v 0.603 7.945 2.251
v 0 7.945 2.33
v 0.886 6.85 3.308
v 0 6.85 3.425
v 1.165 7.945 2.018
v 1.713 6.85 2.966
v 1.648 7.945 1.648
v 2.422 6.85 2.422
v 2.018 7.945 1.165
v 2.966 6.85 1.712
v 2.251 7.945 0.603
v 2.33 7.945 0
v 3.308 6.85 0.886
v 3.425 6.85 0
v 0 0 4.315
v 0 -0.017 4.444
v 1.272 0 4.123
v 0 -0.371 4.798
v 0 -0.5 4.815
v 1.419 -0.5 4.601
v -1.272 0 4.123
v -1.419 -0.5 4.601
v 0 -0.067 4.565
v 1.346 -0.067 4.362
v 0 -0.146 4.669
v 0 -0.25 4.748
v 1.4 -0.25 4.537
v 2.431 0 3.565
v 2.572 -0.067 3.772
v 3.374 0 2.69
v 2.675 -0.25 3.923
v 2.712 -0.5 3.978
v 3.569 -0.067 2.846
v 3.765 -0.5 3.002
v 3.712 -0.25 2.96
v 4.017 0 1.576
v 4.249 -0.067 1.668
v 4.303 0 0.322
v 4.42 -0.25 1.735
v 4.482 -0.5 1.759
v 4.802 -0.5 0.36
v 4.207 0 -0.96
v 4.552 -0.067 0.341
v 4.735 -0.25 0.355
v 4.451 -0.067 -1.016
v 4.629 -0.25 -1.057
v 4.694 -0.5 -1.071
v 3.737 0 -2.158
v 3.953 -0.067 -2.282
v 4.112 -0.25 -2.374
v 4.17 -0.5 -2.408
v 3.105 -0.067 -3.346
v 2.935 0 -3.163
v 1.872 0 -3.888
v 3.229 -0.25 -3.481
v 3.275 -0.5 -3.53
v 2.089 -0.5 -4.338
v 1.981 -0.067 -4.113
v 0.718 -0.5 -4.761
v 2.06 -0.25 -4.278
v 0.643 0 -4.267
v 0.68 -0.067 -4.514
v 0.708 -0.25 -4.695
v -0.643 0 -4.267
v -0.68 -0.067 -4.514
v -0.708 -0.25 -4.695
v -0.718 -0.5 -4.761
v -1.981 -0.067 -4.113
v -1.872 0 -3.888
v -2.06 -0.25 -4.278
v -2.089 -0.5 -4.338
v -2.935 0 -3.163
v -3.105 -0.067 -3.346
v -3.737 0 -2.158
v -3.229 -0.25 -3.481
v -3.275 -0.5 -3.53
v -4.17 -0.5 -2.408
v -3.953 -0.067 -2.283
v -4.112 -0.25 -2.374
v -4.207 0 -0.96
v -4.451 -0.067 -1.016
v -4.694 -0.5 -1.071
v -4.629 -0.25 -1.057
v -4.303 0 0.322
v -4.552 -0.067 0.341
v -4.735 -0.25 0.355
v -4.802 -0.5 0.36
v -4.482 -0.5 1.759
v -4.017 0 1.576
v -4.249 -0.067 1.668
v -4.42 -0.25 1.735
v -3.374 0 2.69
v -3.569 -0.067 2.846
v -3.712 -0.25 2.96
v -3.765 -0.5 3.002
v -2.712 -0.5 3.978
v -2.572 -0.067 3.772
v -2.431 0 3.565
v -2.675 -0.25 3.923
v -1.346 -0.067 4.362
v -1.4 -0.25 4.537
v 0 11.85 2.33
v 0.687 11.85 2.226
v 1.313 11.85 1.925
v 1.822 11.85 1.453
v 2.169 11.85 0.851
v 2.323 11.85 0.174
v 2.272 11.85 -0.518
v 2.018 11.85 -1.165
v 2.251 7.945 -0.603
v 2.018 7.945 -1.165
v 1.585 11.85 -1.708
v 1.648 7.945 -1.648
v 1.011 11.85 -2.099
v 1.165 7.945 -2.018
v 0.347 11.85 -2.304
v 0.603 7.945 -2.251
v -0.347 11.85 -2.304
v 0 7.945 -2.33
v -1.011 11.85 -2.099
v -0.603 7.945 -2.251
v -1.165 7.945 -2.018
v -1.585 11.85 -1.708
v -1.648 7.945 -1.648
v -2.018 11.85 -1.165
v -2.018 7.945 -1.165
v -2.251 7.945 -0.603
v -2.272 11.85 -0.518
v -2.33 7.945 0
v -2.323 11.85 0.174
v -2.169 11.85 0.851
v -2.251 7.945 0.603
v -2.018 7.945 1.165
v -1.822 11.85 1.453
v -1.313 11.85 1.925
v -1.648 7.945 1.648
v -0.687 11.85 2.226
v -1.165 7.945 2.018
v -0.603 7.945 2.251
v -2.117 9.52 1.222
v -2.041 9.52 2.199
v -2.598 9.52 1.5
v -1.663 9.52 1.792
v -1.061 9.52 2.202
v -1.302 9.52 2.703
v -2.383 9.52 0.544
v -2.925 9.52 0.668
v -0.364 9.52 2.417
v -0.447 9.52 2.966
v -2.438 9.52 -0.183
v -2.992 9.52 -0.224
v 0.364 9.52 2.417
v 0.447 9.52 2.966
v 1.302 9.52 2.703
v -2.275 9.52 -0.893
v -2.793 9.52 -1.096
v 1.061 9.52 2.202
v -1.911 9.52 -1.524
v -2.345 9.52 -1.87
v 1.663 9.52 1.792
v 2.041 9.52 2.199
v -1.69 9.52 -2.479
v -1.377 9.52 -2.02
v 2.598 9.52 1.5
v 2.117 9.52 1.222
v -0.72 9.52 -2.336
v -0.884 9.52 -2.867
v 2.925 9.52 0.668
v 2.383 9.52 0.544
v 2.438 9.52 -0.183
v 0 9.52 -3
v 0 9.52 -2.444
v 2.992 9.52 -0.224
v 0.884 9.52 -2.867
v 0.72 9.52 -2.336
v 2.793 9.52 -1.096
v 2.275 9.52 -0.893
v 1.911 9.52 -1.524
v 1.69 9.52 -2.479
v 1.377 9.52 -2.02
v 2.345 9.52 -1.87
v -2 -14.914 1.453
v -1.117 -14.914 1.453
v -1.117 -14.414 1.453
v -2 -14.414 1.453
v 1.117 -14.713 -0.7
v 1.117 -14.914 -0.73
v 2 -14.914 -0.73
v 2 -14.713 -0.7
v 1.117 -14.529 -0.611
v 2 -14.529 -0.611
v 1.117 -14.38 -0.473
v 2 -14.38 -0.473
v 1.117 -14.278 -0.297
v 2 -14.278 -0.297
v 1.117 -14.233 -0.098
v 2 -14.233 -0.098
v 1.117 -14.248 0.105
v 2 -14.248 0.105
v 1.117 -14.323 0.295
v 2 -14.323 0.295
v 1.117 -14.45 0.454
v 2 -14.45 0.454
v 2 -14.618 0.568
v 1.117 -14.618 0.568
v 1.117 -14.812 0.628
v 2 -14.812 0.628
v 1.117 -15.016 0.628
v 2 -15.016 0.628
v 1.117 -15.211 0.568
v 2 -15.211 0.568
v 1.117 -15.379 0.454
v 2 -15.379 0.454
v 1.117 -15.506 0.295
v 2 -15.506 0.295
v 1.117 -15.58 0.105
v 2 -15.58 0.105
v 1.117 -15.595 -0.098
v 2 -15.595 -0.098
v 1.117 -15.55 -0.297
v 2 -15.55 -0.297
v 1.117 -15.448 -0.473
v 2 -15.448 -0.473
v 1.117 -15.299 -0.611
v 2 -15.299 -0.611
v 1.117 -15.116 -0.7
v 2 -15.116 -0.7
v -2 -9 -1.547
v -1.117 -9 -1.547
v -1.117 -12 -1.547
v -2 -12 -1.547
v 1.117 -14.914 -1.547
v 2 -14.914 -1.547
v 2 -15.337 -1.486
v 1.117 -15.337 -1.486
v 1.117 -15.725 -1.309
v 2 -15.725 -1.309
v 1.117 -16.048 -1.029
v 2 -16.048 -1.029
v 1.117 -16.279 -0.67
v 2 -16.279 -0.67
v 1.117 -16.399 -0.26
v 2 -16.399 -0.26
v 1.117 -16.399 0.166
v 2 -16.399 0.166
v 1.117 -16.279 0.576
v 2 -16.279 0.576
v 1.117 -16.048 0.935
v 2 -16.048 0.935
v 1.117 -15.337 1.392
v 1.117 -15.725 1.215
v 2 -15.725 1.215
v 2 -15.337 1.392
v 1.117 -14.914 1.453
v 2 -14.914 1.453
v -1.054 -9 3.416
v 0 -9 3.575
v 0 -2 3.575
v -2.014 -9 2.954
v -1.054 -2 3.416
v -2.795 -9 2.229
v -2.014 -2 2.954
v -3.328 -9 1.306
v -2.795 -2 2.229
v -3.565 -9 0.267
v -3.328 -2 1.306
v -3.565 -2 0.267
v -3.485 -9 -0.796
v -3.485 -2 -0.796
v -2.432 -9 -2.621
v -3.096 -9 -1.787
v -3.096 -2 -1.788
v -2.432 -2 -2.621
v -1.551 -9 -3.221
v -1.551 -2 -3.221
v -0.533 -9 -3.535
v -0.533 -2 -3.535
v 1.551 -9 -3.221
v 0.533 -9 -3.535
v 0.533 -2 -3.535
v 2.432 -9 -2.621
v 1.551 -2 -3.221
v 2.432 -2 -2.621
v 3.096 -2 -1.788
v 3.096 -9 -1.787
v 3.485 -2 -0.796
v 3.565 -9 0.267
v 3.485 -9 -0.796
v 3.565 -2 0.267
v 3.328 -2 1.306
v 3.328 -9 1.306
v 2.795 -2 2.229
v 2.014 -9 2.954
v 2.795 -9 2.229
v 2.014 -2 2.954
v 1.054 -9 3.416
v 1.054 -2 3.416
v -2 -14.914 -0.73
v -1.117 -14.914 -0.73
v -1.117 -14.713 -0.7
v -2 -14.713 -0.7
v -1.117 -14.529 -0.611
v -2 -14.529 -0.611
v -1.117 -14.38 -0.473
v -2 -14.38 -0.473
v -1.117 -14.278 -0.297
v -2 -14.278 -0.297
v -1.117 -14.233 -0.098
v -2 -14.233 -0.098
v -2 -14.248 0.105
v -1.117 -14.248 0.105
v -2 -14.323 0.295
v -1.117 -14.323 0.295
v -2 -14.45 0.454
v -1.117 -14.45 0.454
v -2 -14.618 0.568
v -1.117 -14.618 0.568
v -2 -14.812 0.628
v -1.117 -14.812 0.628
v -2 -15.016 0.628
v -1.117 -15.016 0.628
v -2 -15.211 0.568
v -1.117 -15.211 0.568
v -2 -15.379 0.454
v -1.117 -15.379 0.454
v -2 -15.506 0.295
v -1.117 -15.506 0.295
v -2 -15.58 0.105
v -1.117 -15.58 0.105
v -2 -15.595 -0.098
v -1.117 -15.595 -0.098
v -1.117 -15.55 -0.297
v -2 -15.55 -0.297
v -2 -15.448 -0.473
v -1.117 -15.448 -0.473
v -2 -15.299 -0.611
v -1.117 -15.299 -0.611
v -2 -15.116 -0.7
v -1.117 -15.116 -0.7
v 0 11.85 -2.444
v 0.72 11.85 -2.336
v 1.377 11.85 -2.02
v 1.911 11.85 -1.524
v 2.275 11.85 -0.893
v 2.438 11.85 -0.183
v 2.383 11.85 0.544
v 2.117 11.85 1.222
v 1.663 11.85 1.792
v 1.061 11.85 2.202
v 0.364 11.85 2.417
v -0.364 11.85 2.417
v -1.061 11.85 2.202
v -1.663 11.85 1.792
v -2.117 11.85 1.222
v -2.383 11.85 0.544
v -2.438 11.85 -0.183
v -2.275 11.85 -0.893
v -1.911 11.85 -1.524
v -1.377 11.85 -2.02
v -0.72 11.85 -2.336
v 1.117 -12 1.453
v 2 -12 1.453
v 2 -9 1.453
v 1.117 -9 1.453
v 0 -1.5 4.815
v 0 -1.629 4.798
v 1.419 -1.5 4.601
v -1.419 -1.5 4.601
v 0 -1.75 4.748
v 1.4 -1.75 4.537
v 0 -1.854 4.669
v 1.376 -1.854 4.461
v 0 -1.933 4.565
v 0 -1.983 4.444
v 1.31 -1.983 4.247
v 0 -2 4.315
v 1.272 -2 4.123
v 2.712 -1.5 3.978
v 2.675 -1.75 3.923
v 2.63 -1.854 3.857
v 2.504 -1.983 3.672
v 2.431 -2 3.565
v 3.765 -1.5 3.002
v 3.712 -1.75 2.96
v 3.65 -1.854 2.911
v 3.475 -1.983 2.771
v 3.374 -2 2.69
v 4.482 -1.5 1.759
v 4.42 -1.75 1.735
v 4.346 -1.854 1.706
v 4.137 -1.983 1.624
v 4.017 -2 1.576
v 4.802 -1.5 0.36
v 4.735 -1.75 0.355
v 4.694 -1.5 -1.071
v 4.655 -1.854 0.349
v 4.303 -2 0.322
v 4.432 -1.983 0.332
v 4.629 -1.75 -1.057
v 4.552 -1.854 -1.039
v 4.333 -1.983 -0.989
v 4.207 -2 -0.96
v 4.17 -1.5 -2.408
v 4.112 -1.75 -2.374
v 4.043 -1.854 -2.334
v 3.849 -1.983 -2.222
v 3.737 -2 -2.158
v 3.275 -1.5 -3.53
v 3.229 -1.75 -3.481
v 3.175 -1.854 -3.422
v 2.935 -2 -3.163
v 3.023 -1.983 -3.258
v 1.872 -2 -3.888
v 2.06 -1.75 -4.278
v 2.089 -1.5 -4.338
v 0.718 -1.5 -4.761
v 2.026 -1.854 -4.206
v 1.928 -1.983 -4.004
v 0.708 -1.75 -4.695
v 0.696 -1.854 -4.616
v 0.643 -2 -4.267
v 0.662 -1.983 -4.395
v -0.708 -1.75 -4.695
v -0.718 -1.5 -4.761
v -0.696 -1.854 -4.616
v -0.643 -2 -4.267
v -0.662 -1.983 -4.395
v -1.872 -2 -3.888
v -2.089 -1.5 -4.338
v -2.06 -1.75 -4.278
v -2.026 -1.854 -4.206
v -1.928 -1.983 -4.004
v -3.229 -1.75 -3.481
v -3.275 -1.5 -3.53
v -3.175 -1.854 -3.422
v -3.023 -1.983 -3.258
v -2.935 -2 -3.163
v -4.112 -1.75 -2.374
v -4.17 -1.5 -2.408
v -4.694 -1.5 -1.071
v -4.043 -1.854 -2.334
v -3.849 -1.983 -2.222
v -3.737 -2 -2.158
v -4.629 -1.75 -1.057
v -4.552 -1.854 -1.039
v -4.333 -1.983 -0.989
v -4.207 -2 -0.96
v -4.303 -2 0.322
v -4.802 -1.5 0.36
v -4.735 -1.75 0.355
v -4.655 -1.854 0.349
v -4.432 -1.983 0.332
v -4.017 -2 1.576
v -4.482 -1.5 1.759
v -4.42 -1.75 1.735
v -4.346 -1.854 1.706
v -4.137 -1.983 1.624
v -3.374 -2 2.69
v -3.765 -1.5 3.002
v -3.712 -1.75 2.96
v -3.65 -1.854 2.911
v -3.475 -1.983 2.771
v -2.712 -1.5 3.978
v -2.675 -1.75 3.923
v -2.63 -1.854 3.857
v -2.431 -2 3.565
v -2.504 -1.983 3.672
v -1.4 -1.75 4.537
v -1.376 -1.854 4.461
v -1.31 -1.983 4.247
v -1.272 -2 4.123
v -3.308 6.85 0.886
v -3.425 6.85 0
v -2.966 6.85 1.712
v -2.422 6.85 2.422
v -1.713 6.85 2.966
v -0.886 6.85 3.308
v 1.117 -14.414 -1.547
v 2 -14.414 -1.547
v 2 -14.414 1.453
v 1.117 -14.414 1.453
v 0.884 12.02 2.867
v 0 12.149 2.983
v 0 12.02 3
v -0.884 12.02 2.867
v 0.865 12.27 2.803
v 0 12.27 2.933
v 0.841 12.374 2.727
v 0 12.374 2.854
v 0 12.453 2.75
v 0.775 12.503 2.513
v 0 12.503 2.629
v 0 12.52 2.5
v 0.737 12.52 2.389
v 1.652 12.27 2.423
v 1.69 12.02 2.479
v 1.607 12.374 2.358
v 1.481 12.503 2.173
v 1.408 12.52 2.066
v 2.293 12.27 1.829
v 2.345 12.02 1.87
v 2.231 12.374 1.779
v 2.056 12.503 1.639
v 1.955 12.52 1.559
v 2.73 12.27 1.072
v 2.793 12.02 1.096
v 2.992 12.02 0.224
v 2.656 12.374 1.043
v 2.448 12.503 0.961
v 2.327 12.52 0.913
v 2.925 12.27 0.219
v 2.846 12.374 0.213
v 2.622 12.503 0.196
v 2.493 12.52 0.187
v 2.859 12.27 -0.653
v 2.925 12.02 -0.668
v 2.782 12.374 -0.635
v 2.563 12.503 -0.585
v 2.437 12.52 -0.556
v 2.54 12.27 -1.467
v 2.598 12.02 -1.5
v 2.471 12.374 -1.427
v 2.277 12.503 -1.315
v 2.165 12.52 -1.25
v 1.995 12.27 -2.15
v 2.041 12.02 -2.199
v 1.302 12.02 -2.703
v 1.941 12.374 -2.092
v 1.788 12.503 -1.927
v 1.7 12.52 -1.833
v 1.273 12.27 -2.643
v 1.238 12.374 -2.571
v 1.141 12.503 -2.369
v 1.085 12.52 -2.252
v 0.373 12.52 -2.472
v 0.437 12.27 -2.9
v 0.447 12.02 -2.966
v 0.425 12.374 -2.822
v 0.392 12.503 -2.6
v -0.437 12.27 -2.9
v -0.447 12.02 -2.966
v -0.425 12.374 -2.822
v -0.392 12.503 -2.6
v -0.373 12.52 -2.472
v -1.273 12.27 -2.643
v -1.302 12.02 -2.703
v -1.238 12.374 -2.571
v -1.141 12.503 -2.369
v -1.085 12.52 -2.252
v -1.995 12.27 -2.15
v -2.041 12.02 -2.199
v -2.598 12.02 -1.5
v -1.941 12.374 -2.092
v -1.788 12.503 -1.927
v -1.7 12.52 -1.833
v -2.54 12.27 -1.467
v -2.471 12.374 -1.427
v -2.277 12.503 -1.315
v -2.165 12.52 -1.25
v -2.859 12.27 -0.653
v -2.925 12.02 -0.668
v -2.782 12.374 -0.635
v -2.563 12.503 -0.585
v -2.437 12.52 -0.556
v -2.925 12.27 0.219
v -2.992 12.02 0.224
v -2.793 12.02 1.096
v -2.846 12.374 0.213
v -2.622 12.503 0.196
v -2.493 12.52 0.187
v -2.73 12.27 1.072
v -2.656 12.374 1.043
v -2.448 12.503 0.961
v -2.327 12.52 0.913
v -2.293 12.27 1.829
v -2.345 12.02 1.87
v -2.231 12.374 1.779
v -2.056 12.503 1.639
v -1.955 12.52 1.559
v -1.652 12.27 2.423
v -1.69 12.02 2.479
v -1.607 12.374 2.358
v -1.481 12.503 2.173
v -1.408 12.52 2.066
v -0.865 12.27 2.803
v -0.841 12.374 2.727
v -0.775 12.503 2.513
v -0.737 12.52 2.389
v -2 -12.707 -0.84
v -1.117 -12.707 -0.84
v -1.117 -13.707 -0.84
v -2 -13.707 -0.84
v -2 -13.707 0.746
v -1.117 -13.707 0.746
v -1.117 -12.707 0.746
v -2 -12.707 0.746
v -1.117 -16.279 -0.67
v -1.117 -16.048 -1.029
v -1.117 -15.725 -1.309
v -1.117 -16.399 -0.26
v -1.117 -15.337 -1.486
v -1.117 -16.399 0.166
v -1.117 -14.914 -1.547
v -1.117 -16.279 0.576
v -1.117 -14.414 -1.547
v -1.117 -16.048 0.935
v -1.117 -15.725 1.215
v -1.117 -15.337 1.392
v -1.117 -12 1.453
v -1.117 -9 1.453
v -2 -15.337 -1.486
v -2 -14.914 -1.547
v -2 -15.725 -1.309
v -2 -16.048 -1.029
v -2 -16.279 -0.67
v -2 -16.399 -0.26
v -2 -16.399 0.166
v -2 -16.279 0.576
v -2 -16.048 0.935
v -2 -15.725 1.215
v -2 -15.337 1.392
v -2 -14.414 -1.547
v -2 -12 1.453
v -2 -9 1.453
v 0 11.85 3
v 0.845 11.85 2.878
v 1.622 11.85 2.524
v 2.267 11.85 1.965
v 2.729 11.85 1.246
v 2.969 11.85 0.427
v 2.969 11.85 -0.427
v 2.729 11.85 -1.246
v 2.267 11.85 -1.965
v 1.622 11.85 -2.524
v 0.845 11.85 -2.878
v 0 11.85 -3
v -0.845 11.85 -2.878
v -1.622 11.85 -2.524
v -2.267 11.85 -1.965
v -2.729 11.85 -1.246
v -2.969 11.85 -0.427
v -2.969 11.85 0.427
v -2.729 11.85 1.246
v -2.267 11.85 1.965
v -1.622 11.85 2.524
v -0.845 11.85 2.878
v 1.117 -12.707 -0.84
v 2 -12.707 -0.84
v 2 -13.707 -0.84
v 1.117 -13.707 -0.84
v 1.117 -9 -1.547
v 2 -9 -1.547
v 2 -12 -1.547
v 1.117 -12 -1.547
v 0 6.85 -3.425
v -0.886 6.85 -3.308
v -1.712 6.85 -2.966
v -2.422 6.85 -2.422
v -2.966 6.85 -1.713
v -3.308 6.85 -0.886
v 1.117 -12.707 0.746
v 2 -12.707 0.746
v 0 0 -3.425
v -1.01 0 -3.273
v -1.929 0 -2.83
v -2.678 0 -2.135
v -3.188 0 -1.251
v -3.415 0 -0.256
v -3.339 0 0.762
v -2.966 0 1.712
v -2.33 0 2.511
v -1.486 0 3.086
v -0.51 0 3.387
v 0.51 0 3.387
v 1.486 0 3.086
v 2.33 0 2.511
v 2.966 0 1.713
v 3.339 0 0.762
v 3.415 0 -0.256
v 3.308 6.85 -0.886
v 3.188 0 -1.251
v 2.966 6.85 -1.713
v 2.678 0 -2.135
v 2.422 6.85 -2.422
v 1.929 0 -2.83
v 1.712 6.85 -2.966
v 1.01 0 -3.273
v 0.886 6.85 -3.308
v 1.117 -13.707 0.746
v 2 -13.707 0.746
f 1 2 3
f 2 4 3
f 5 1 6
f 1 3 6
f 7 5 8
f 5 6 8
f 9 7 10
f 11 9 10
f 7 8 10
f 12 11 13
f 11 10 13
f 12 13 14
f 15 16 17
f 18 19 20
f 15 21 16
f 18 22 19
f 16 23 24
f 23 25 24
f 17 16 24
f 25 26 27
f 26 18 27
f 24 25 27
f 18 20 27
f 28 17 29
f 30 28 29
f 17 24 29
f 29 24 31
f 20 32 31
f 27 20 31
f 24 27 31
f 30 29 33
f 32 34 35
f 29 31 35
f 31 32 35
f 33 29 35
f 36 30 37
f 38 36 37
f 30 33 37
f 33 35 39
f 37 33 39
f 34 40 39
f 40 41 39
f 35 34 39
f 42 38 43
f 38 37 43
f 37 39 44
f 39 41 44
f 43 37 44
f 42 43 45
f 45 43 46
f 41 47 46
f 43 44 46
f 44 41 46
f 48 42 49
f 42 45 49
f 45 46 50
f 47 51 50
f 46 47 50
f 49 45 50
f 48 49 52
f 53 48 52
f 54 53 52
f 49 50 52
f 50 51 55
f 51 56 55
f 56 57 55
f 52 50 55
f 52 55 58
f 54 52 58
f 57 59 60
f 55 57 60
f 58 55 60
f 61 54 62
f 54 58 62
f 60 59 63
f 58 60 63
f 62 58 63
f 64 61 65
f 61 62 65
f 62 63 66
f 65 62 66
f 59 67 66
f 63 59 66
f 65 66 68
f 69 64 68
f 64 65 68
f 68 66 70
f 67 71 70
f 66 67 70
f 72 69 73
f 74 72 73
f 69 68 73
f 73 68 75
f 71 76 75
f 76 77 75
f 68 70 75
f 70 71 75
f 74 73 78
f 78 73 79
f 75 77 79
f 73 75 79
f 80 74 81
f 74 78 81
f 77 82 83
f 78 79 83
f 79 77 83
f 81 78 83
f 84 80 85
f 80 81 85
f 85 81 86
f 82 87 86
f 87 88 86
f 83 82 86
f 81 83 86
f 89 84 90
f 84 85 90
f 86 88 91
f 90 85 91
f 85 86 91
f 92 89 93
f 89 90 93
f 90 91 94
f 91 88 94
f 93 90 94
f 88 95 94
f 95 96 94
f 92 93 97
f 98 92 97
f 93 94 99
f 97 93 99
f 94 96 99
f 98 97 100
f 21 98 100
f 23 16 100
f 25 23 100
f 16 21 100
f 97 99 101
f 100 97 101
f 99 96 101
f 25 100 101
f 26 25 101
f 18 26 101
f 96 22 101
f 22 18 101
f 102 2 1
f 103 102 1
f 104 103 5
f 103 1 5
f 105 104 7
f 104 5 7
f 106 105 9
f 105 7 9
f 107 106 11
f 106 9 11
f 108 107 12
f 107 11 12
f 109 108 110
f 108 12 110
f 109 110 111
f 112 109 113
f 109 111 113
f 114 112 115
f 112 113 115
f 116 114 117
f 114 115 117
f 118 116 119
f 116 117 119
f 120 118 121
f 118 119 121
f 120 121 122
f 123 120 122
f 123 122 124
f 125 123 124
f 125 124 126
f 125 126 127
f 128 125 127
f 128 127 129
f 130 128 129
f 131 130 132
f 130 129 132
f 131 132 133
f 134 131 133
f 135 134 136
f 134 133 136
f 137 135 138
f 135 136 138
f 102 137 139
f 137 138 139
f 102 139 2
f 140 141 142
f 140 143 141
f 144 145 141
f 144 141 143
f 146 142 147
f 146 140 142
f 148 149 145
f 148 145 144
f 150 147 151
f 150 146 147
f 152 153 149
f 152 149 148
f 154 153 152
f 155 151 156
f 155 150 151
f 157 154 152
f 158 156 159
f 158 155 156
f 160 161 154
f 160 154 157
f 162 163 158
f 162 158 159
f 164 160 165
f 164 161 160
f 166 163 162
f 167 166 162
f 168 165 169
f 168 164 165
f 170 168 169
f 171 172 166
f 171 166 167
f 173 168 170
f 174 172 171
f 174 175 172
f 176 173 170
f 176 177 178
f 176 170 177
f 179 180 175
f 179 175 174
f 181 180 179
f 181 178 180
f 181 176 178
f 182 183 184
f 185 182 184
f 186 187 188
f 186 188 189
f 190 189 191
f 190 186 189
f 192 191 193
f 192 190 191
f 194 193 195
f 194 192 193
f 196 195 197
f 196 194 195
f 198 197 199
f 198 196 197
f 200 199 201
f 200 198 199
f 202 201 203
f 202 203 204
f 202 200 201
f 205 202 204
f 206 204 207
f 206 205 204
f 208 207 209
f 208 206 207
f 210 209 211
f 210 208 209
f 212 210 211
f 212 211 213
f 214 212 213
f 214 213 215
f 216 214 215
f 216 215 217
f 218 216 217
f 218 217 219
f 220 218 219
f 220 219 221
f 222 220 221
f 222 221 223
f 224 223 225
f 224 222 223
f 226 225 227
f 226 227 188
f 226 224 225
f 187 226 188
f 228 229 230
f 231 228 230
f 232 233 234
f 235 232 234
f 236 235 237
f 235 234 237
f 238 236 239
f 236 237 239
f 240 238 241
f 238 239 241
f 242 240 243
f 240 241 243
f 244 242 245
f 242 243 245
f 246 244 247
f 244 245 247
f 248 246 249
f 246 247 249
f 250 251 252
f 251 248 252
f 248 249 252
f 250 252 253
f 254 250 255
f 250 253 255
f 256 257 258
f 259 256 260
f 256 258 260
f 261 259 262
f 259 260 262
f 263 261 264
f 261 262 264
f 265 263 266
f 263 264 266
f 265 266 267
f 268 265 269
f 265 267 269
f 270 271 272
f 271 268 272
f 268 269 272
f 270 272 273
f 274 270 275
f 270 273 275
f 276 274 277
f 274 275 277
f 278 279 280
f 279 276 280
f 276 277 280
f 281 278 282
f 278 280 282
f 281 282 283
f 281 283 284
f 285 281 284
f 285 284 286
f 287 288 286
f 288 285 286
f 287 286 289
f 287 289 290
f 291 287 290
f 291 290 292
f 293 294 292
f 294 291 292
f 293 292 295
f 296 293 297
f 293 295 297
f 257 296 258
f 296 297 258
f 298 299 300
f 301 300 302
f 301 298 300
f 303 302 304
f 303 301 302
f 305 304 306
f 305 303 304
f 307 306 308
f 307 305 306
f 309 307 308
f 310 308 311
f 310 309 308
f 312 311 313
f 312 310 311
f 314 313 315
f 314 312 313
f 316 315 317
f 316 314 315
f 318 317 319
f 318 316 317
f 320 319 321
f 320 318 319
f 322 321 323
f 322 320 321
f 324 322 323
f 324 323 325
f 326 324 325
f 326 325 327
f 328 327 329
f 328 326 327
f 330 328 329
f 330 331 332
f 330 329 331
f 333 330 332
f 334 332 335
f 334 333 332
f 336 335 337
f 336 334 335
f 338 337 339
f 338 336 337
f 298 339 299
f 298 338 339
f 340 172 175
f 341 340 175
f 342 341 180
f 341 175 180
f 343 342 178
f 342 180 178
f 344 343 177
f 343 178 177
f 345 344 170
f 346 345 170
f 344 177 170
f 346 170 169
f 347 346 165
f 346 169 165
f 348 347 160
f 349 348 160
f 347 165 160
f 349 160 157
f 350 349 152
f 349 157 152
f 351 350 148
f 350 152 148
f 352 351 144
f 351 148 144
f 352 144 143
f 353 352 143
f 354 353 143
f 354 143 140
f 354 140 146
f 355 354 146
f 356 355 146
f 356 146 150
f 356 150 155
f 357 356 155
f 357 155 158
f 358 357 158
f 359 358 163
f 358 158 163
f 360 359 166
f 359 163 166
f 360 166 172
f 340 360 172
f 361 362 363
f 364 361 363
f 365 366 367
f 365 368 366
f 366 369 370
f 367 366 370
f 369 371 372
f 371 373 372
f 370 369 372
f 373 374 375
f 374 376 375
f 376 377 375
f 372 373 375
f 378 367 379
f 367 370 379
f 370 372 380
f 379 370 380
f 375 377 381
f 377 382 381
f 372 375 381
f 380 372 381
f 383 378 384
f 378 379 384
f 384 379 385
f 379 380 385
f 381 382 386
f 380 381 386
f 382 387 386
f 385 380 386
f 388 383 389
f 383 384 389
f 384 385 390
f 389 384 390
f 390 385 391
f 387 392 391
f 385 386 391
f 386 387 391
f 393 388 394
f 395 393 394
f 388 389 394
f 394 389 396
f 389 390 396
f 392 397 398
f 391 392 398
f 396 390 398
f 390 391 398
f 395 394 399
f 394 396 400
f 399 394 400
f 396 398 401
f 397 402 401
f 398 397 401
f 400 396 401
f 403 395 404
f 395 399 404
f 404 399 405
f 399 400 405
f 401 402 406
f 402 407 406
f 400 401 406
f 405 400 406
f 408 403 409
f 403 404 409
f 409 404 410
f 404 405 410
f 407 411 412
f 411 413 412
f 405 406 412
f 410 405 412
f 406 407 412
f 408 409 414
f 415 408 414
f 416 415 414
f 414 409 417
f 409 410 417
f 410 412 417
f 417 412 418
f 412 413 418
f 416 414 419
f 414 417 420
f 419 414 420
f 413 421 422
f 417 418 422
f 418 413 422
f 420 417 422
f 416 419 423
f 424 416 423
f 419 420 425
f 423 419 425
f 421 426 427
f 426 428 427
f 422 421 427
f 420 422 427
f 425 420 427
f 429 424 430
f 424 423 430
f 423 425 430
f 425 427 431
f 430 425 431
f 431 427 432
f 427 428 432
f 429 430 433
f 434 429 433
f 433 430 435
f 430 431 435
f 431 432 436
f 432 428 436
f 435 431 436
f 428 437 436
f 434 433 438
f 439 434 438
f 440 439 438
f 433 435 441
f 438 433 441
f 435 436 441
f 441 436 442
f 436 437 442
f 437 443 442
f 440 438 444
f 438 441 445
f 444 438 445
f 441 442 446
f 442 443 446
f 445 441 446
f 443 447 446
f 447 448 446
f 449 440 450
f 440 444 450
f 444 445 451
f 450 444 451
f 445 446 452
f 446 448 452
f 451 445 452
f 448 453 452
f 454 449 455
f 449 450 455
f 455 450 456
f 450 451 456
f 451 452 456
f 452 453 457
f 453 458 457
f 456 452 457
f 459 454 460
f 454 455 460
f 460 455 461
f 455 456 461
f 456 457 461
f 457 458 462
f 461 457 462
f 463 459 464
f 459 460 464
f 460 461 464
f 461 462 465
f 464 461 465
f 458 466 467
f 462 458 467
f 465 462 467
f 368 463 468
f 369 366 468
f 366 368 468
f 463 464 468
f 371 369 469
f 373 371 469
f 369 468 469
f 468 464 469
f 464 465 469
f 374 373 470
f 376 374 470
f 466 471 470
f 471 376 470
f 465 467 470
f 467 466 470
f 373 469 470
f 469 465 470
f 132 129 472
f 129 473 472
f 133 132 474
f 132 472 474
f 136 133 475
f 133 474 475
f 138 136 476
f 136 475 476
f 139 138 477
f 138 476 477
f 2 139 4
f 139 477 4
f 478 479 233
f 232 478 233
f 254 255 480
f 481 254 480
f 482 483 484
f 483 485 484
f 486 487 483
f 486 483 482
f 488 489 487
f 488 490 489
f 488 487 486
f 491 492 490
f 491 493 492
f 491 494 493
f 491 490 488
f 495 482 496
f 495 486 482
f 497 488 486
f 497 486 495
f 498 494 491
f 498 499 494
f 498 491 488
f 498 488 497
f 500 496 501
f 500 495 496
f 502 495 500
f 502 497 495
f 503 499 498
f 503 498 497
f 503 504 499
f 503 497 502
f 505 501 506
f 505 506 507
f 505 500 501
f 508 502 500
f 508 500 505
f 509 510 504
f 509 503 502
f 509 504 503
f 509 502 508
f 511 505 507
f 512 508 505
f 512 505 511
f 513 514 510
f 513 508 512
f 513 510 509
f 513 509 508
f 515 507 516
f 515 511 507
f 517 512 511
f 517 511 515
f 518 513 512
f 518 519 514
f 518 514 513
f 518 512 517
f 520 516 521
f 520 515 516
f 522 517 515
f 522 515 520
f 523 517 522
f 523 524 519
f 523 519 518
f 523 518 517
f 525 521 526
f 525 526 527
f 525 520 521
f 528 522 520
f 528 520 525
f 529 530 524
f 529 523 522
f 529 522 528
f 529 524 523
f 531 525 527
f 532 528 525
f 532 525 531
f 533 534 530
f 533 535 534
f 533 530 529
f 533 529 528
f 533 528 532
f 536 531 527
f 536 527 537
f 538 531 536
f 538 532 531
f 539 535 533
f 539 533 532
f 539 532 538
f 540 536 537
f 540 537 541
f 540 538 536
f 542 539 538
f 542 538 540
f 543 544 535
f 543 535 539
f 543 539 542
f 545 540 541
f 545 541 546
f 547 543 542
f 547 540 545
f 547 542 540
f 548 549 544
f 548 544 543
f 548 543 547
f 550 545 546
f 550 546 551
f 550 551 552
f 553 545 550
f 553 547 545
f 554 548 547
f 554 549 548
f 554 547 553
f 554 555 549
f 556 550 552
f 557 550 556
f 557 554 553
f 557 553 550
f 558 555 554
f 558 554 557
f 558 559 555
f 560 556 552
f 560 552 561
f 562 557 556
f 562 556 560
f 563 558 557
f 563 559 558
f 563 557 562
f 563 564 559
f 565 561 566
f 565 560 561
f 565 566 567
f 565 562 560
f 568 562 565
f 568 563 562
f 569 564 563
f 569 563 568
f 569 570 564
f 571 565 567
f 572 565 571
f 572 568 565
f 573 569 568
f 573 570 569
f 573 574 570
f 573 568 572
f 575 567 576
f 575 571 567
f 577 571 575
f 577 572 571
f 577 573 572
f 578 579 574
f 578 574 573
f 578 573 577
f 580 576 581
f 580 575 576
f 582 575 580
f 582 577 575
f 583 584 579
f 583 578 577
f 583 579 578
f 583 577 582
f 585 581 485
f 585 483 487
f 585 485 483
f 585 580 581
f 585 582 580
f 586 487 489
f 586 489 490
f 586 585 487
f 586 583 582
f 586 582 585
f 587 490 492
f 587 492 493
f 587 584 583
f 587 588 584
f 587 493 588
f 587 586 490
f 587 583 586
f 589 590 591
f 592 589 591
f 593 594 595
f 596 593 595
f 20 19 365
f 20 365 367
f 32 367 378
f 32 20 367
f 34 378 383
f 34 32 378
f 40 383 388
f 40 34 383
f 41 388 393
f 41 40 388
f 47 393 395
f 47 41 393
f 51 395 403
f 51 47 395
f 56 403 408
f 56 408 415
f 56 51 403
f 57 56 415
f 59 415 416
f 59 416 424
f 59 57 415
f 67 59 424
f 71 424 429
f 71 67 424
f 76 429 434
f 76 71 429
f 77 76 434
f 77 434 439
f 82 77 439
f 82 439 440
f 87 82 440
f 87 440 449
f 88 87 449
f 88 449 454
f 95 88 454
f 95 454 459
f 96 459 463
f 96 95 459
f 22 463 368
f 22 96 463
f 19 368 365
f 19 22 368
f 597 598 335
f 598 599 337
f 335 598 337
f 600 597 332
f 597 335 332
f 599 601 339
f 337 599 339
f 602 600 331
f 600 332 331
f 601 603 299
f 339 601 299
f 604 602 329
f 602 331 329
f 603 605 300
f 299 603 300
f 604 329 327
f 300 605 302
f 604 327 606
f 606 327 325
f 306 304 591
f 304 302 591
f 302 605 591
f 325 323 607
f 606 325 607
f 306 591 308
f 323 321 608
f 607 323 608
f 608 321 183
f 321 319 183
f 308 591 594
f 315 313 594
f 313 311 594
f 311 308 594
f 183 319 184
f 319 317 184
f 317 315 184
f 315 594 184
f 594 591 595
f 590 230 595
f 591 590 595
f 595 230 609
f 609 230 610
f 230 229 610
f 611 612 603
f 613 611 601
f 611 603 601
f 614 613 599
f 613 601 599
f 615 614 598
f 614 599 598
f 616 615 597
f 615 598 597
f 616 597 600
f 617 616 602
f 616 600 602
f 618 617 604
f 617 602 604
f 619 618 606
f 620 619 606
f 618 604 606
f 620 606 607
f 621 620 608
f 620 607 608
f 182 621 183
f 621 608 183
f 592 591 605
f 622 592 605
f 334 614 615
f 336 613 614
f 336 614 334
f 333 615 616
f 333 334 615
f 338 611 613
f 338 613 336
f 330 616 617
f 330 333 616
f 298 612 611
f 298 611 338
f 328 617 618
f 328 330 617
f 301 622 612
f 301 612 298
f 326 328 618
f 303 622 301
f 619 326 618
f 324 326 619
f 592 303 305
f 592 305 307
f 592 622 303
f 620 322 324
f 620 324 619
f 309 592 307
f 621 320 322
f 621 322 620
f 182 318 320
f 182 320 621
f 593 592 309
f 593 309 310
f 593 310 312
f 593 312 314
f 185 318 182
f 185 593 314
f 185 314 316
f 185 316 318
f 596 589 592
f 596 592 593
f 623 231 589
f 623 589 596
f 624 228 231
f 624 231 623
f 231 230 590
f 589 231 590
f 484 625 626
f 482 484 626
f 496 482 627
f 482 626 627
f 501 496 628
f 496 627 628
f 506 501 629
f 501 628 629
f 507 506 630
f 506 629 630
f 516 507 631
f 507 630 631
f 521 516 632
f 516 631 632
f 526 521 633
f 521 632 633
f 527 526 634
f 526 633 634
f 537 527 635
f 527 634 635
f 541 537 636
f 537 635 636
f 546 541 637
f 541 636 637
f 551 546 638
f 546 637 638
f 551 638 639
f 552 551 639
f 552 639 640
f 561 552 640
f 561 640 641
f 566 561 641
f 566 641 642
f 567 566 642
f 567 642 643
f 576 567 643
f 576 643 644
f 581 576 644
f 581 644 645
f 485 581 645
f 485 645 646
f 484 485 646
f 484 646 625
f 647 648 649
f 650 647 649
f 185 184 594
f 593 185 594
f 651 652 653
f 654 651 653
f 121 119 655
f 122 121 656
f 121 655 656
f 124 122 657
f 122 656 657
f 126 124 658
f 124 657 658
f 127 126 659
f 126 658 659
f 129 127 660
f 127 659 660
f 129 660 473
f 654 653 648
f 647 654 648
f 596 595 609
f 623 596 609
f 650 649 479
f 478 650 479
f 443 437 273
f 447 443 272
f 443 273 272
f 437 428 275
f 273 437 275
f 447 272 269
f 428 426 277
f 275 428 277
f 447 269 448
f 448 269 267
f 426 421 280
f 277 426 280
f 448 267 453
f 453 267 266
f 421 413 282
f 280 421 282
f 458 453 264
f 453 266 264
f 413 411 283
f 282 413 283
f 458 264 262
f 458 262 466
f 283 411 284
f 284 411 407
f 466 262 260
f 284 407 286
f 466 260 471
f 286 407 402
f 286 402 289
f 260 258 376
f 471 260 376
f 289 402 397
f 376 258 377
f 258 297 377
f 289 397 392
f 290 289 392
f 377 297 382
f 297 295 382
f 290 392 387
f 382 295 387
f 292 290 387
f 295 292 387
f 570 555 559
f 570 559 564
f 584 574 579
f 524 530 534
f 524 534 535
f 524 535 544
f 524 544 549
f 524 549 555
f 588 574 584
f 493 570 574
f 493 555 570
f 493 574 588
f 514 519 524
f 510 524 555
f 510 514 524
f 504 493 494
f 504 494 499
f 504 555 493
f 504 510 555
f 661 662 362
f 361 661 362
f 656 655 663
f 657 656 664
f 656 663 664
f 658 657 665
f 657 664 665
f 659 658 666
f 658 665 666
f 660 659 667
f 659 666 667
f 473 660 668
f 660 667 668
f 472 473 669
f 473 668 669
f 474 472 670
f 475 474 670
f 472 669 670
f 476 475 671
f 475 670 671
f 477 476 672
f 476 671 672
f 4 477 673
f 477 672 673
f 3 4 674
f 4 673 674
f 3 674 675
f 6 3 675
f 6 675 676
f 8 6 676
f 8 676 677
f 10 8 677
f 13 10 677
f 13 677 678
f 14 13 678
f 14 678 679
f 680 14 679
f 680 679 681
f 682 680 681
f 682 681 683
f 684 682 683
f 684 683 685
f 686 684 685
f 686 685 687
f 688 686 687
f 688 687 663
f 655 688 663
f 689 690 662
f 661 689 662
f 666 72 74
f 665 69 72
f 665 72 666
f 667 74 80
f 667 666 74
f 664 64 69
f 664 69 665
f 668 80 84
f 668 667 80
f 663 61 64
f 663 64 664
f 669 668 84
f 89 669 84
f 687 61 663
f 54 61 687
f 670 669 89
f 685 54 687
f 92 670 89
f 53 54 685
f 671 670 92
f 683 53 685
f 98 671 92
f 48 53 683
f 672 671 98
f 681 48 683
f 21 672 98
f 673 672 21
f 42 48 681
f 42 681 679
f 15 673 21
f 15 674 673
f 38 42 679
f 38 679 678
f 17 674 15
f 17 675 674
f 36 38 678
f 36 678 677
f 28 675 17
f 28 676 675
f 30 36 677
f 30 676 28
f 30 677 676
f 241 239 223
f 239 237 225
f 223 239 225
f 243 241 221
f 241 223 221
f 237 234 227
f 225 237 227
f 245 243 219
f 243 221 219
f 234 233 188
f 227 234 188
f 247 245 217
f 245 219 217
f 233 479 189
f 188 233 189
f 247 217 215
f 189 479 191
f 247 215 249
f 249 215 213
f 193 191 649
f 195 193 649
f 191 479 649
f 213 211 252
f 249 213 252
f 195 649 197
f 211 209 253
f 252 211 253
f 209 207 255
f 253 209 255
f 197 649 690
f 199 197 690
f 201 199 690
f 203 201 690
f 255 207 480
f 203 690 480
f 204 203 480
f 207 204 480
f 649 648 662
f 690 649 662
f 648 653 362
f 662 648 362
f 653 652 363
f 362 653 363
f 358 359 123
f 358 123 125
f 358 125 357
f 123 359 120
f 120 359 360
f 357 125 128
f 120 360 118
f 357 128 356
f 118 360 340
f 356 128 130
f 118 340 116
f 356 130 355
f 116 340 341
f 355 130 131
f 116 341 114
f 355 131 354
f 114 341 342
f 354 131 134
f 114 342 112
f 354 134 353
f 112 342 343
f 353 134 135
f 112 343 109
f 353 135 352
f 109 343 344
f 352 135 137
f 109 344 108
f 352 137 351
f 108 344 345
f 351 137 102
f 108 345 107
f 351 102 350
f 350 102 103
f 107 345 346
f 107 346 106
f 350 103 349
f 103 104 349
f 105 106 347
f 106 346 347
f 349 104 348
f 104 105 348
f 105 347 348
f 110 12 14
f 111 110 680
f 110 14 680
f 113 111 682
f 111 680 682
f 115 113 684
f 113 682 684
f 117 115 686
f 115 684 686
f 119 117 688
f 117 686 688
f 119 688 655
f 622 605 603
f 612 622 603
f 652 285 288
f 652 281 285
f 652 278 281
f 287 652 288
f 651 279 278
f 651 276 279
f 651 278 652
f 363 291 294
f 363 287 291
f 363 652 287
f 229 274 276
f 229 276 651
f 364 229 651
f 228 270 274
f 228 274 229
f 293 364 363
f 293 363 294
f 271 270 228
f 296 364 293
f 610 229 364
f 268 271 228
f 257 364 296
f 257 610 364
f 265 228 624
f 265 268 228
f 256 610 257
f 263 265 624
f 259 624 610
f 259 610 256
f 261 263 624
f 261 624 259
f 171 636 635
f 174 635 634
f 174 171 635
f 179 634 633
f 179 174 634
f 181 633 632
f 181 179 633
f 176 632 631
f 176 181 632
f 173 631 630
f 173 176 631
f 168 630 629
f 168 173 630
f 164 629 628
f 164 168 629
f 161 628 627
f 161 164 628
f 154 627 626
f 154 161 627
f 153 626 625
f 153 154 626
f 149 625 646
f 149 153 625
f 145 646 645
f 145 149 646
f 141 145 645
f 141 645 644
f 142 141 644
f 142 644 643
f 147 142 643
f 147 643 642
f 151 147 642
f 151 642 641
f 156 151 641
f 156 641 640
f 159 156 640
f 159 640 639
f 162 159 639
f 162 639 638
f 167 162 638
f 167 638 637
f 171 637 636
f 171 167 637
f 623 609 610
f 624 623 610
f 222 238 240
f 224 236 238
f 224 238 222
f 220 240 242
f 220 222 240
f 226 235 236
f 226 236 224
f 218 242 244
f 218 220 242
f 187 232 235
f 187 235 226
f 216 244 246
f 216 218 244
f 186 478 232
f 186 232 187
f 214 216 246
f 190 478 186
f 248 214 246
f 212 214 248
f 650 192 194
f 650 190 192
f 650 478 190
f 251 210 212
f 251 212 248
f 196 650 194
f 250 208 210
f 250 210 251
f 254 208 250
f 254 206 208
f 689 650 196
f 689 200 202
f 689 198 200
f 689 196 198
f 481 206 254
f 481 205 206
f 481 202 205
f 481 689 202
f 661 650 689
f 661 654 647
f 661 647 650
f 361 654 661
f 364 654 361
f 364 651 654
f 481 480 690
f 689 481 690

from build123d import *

# Parameters (mm, degrees)
SKETCH1_R           = 4.815
BOSS_EXTRUDE1_DEPTH = 2
SKETCH2_R           = 3.575
BOSS_EXTRUDE2_DEPTH = 7
SKETCH3_R           = 3.425
BOSS_EXTRUDE3_DEPTH = 6.85
SKETCH4_R           = 2.33
BOSS_EXTRUDE4_DEPTH = 5
SKETCH6_R           = 3
BOSS_EXTRUDE5_DEPTH = 0.67
BOSS_EXTRUDE6_START = 2.33
SKETCH7_R           = 3
SKETCH7_R_2         = 2.444387837
BOSS_EXTRUDE6_DEPTH = 2.33
SKETCH8_R           = 0.683030706
BOSS_EXTRUDE7_DEPTH = 2
SKETCH9_W           = 2.23373787
SKETCH9_H           = 6.792121548
CUT_EXTRUDE1_DEPTH  = 23.571638177
FILLET2_R           = 0.5
FILLET3_R           = 0.5


with BuildPart() as part:
    # Sketch1 → Boss-Extrude1 (new body)
    with BuildSketch(Plane(origin=(0, 0, 0), x_dir=(1, 0, 0), z_dir=(0, 1, 0))):
        with Locations(Location((0, 0, 0), (0, 0, 270))):
            Circle(SKETCH1_R)
    extrude(amount=-BOSS_EXTRUDE1_DEPTH)

    # Sketch2 → Boss-Extrude2 (add)
    with BuildSketch(Plane.XZ.offset(2)):
        with Locations(Location((0, 0, 0), (0, 0, 90))):
            Circle(SKETCH2_R)
    extrude(amount=BOSS_EXTRUDE2_DEPTH)

    # Sketch3 → Boss-Extrude3 (add)
    with BuildSketch(Plane(origin=(0, 0, 0), x_dir=(1, 0, 0), z_dir=(0, 1, 0))):
        with Locations(Location((0, 0, 0), (0, 0, 90))):
            Circle(SKETCH3_R)
    extrude(amount=BOSS_EXTRUDE3_DEPTH)

    # Sketch4 → Boss-Extrude4 (add)
    with BuildSketch(Plane(origin=(0, 6.85, 0), x_dir=(1, 0, 0), z_dir=(0, 1, 0))):
        with Locations(Location((0, 0, 0), (0, 0, 270))):
            Circle(SKETCH4_R)
    extrude(amount=BOSS_EXTRUDE4_DEPTH)

    # Sweep1: sweep along a curve in space
    with BuildLine() as sweep1_path:
        ThreePointArc((0, 6.85, 2.33), (1.6475588, 6.85, 1.6475588), (2.33, 6.85, 0))
        ThreePointArc((2.33, 6.85, 0), (1.6475588, 6.85, -1.6475588), (0, 6.85, -2.33))
        ThreePointArc((0, 6.85, -2.33), (-1.6475588, 6.85, -1.6475588), (-2.33, 6.85, 0))
        ThreePointArc((-2.33, 6.85, 0), (-1.6475588, 6.85, 1.6475588), (0, 6.85, 2.33))
    # Sketch5 → Sweep1 (sweep)
    with BuildSketch(Plane.XY):
        Polygon((-3.425, 6.85), (-2.33, 7.945), (-2.33, 6.85), align=None)
    sweep(path=sweep1_path.line)

    # Sketch6 → Boss-Extrude5 (add)
    with BuildSketch(Plane(origin=(0, 11.85, 0), x_dir=(1, 0, 0), z_dir=(0, 1, 0))):
        with Locations(Location((0, 0, 0), (0, 0, 270))):
            Circle(SKETCH6_R)
    extrude(amount=BOSS_EXTRUDE5_DEPTH)

    # Sketch7 → Boss-Extrude6 (add)
    with BuildSketch(Plane.XZ.offset(-11.85).offset(BOSS_EXTRUDE6_START)):
        with Locations(Location((0, 0, 0), (0, 0, 270))):
            Circle(SKETCH7_R)
        with Locations(Location((0, 0, 0), (0, 0, 270))):
            Circle(SKETCH7_R_2, mode=Mode.SUBTRACT)
    extrude(amount=-BOSS_EXTRUDE6_DEPTH)

    # Sketch8 → Boss-Extrude7 (add, symmetric)
    with BuildSketch(Plane(origin=(0, 0, 0), x_dir=(0, 0, -1), z_dir=(1, 0, 0))):
        with BuildLine():
            Line((-1.452989765, -9), (1.547010235, -9))
            Line((1.547010235, -9), (1.547010235, -12))
            Line((1.547010235, -12), (0.839903454, -12.707106781))
            Line((0.839903454, -12.707106781), (0.839903454, -13.707106781))
            Line((0.839903454, -13.707106781), (1.547010235, -14.414213562))
            Line((1.547010235, -14.414213562), (1.547010235, -14.914213562))
            ThreePointArc((1.547010235, -14.914213562), (0.047010235, -16.414213562), (-1.452989765, -14.914213562))
            Line((-1.452989765, -14.914213562), (-1.452989765, -14.414213562))
            Line((-1.452989765, -14.414213562), (-0.745882984, -13.707106781))
            Line((-0.745882984, -13.707106781), (-0.745882984, -12.707106781))
            Line((-0.745882984, -12.707106781), (-1.452989765, -12))
            Line((-1.452989765, -12), (-1.452989765, -9))
        make_face()
        with Locations((0.047010235, -14.914213562)):
            Circle(SKETCH8_R, mode=Mode.SUBTRACT)
    extrude(amount=BOSS_EXTRUDE7_DEPTH, both=True)

    # Sketch9 → Cut-Extrude1 (cut, through all)
    with BuildSketch(Plane.XZ.offset(9)):
        Rectangle(SKETCH9_W, SKETCH9_H)
    extrude(amount=CUT_EXTRUDE1_DEPTH, mode=Mode.SUBTRACT)

    # Fillet2
    fillet2_edges = [part.edges().sort_by_distance(p)[0] for p in [
        (0, 0, -4.815),
        (0, -2, -4.815),
    ]]
    fillet(fillet2_edges, radius=FILLET2_R)

    # Fillet3
    fillet3_edges = [part.edges().sort_by_distance(p)[0] for p in [
        (0, 12.52, -3),
    ]]
    fillet(fillet3_edges, radius=FILLET3_R)


solid = part.part
